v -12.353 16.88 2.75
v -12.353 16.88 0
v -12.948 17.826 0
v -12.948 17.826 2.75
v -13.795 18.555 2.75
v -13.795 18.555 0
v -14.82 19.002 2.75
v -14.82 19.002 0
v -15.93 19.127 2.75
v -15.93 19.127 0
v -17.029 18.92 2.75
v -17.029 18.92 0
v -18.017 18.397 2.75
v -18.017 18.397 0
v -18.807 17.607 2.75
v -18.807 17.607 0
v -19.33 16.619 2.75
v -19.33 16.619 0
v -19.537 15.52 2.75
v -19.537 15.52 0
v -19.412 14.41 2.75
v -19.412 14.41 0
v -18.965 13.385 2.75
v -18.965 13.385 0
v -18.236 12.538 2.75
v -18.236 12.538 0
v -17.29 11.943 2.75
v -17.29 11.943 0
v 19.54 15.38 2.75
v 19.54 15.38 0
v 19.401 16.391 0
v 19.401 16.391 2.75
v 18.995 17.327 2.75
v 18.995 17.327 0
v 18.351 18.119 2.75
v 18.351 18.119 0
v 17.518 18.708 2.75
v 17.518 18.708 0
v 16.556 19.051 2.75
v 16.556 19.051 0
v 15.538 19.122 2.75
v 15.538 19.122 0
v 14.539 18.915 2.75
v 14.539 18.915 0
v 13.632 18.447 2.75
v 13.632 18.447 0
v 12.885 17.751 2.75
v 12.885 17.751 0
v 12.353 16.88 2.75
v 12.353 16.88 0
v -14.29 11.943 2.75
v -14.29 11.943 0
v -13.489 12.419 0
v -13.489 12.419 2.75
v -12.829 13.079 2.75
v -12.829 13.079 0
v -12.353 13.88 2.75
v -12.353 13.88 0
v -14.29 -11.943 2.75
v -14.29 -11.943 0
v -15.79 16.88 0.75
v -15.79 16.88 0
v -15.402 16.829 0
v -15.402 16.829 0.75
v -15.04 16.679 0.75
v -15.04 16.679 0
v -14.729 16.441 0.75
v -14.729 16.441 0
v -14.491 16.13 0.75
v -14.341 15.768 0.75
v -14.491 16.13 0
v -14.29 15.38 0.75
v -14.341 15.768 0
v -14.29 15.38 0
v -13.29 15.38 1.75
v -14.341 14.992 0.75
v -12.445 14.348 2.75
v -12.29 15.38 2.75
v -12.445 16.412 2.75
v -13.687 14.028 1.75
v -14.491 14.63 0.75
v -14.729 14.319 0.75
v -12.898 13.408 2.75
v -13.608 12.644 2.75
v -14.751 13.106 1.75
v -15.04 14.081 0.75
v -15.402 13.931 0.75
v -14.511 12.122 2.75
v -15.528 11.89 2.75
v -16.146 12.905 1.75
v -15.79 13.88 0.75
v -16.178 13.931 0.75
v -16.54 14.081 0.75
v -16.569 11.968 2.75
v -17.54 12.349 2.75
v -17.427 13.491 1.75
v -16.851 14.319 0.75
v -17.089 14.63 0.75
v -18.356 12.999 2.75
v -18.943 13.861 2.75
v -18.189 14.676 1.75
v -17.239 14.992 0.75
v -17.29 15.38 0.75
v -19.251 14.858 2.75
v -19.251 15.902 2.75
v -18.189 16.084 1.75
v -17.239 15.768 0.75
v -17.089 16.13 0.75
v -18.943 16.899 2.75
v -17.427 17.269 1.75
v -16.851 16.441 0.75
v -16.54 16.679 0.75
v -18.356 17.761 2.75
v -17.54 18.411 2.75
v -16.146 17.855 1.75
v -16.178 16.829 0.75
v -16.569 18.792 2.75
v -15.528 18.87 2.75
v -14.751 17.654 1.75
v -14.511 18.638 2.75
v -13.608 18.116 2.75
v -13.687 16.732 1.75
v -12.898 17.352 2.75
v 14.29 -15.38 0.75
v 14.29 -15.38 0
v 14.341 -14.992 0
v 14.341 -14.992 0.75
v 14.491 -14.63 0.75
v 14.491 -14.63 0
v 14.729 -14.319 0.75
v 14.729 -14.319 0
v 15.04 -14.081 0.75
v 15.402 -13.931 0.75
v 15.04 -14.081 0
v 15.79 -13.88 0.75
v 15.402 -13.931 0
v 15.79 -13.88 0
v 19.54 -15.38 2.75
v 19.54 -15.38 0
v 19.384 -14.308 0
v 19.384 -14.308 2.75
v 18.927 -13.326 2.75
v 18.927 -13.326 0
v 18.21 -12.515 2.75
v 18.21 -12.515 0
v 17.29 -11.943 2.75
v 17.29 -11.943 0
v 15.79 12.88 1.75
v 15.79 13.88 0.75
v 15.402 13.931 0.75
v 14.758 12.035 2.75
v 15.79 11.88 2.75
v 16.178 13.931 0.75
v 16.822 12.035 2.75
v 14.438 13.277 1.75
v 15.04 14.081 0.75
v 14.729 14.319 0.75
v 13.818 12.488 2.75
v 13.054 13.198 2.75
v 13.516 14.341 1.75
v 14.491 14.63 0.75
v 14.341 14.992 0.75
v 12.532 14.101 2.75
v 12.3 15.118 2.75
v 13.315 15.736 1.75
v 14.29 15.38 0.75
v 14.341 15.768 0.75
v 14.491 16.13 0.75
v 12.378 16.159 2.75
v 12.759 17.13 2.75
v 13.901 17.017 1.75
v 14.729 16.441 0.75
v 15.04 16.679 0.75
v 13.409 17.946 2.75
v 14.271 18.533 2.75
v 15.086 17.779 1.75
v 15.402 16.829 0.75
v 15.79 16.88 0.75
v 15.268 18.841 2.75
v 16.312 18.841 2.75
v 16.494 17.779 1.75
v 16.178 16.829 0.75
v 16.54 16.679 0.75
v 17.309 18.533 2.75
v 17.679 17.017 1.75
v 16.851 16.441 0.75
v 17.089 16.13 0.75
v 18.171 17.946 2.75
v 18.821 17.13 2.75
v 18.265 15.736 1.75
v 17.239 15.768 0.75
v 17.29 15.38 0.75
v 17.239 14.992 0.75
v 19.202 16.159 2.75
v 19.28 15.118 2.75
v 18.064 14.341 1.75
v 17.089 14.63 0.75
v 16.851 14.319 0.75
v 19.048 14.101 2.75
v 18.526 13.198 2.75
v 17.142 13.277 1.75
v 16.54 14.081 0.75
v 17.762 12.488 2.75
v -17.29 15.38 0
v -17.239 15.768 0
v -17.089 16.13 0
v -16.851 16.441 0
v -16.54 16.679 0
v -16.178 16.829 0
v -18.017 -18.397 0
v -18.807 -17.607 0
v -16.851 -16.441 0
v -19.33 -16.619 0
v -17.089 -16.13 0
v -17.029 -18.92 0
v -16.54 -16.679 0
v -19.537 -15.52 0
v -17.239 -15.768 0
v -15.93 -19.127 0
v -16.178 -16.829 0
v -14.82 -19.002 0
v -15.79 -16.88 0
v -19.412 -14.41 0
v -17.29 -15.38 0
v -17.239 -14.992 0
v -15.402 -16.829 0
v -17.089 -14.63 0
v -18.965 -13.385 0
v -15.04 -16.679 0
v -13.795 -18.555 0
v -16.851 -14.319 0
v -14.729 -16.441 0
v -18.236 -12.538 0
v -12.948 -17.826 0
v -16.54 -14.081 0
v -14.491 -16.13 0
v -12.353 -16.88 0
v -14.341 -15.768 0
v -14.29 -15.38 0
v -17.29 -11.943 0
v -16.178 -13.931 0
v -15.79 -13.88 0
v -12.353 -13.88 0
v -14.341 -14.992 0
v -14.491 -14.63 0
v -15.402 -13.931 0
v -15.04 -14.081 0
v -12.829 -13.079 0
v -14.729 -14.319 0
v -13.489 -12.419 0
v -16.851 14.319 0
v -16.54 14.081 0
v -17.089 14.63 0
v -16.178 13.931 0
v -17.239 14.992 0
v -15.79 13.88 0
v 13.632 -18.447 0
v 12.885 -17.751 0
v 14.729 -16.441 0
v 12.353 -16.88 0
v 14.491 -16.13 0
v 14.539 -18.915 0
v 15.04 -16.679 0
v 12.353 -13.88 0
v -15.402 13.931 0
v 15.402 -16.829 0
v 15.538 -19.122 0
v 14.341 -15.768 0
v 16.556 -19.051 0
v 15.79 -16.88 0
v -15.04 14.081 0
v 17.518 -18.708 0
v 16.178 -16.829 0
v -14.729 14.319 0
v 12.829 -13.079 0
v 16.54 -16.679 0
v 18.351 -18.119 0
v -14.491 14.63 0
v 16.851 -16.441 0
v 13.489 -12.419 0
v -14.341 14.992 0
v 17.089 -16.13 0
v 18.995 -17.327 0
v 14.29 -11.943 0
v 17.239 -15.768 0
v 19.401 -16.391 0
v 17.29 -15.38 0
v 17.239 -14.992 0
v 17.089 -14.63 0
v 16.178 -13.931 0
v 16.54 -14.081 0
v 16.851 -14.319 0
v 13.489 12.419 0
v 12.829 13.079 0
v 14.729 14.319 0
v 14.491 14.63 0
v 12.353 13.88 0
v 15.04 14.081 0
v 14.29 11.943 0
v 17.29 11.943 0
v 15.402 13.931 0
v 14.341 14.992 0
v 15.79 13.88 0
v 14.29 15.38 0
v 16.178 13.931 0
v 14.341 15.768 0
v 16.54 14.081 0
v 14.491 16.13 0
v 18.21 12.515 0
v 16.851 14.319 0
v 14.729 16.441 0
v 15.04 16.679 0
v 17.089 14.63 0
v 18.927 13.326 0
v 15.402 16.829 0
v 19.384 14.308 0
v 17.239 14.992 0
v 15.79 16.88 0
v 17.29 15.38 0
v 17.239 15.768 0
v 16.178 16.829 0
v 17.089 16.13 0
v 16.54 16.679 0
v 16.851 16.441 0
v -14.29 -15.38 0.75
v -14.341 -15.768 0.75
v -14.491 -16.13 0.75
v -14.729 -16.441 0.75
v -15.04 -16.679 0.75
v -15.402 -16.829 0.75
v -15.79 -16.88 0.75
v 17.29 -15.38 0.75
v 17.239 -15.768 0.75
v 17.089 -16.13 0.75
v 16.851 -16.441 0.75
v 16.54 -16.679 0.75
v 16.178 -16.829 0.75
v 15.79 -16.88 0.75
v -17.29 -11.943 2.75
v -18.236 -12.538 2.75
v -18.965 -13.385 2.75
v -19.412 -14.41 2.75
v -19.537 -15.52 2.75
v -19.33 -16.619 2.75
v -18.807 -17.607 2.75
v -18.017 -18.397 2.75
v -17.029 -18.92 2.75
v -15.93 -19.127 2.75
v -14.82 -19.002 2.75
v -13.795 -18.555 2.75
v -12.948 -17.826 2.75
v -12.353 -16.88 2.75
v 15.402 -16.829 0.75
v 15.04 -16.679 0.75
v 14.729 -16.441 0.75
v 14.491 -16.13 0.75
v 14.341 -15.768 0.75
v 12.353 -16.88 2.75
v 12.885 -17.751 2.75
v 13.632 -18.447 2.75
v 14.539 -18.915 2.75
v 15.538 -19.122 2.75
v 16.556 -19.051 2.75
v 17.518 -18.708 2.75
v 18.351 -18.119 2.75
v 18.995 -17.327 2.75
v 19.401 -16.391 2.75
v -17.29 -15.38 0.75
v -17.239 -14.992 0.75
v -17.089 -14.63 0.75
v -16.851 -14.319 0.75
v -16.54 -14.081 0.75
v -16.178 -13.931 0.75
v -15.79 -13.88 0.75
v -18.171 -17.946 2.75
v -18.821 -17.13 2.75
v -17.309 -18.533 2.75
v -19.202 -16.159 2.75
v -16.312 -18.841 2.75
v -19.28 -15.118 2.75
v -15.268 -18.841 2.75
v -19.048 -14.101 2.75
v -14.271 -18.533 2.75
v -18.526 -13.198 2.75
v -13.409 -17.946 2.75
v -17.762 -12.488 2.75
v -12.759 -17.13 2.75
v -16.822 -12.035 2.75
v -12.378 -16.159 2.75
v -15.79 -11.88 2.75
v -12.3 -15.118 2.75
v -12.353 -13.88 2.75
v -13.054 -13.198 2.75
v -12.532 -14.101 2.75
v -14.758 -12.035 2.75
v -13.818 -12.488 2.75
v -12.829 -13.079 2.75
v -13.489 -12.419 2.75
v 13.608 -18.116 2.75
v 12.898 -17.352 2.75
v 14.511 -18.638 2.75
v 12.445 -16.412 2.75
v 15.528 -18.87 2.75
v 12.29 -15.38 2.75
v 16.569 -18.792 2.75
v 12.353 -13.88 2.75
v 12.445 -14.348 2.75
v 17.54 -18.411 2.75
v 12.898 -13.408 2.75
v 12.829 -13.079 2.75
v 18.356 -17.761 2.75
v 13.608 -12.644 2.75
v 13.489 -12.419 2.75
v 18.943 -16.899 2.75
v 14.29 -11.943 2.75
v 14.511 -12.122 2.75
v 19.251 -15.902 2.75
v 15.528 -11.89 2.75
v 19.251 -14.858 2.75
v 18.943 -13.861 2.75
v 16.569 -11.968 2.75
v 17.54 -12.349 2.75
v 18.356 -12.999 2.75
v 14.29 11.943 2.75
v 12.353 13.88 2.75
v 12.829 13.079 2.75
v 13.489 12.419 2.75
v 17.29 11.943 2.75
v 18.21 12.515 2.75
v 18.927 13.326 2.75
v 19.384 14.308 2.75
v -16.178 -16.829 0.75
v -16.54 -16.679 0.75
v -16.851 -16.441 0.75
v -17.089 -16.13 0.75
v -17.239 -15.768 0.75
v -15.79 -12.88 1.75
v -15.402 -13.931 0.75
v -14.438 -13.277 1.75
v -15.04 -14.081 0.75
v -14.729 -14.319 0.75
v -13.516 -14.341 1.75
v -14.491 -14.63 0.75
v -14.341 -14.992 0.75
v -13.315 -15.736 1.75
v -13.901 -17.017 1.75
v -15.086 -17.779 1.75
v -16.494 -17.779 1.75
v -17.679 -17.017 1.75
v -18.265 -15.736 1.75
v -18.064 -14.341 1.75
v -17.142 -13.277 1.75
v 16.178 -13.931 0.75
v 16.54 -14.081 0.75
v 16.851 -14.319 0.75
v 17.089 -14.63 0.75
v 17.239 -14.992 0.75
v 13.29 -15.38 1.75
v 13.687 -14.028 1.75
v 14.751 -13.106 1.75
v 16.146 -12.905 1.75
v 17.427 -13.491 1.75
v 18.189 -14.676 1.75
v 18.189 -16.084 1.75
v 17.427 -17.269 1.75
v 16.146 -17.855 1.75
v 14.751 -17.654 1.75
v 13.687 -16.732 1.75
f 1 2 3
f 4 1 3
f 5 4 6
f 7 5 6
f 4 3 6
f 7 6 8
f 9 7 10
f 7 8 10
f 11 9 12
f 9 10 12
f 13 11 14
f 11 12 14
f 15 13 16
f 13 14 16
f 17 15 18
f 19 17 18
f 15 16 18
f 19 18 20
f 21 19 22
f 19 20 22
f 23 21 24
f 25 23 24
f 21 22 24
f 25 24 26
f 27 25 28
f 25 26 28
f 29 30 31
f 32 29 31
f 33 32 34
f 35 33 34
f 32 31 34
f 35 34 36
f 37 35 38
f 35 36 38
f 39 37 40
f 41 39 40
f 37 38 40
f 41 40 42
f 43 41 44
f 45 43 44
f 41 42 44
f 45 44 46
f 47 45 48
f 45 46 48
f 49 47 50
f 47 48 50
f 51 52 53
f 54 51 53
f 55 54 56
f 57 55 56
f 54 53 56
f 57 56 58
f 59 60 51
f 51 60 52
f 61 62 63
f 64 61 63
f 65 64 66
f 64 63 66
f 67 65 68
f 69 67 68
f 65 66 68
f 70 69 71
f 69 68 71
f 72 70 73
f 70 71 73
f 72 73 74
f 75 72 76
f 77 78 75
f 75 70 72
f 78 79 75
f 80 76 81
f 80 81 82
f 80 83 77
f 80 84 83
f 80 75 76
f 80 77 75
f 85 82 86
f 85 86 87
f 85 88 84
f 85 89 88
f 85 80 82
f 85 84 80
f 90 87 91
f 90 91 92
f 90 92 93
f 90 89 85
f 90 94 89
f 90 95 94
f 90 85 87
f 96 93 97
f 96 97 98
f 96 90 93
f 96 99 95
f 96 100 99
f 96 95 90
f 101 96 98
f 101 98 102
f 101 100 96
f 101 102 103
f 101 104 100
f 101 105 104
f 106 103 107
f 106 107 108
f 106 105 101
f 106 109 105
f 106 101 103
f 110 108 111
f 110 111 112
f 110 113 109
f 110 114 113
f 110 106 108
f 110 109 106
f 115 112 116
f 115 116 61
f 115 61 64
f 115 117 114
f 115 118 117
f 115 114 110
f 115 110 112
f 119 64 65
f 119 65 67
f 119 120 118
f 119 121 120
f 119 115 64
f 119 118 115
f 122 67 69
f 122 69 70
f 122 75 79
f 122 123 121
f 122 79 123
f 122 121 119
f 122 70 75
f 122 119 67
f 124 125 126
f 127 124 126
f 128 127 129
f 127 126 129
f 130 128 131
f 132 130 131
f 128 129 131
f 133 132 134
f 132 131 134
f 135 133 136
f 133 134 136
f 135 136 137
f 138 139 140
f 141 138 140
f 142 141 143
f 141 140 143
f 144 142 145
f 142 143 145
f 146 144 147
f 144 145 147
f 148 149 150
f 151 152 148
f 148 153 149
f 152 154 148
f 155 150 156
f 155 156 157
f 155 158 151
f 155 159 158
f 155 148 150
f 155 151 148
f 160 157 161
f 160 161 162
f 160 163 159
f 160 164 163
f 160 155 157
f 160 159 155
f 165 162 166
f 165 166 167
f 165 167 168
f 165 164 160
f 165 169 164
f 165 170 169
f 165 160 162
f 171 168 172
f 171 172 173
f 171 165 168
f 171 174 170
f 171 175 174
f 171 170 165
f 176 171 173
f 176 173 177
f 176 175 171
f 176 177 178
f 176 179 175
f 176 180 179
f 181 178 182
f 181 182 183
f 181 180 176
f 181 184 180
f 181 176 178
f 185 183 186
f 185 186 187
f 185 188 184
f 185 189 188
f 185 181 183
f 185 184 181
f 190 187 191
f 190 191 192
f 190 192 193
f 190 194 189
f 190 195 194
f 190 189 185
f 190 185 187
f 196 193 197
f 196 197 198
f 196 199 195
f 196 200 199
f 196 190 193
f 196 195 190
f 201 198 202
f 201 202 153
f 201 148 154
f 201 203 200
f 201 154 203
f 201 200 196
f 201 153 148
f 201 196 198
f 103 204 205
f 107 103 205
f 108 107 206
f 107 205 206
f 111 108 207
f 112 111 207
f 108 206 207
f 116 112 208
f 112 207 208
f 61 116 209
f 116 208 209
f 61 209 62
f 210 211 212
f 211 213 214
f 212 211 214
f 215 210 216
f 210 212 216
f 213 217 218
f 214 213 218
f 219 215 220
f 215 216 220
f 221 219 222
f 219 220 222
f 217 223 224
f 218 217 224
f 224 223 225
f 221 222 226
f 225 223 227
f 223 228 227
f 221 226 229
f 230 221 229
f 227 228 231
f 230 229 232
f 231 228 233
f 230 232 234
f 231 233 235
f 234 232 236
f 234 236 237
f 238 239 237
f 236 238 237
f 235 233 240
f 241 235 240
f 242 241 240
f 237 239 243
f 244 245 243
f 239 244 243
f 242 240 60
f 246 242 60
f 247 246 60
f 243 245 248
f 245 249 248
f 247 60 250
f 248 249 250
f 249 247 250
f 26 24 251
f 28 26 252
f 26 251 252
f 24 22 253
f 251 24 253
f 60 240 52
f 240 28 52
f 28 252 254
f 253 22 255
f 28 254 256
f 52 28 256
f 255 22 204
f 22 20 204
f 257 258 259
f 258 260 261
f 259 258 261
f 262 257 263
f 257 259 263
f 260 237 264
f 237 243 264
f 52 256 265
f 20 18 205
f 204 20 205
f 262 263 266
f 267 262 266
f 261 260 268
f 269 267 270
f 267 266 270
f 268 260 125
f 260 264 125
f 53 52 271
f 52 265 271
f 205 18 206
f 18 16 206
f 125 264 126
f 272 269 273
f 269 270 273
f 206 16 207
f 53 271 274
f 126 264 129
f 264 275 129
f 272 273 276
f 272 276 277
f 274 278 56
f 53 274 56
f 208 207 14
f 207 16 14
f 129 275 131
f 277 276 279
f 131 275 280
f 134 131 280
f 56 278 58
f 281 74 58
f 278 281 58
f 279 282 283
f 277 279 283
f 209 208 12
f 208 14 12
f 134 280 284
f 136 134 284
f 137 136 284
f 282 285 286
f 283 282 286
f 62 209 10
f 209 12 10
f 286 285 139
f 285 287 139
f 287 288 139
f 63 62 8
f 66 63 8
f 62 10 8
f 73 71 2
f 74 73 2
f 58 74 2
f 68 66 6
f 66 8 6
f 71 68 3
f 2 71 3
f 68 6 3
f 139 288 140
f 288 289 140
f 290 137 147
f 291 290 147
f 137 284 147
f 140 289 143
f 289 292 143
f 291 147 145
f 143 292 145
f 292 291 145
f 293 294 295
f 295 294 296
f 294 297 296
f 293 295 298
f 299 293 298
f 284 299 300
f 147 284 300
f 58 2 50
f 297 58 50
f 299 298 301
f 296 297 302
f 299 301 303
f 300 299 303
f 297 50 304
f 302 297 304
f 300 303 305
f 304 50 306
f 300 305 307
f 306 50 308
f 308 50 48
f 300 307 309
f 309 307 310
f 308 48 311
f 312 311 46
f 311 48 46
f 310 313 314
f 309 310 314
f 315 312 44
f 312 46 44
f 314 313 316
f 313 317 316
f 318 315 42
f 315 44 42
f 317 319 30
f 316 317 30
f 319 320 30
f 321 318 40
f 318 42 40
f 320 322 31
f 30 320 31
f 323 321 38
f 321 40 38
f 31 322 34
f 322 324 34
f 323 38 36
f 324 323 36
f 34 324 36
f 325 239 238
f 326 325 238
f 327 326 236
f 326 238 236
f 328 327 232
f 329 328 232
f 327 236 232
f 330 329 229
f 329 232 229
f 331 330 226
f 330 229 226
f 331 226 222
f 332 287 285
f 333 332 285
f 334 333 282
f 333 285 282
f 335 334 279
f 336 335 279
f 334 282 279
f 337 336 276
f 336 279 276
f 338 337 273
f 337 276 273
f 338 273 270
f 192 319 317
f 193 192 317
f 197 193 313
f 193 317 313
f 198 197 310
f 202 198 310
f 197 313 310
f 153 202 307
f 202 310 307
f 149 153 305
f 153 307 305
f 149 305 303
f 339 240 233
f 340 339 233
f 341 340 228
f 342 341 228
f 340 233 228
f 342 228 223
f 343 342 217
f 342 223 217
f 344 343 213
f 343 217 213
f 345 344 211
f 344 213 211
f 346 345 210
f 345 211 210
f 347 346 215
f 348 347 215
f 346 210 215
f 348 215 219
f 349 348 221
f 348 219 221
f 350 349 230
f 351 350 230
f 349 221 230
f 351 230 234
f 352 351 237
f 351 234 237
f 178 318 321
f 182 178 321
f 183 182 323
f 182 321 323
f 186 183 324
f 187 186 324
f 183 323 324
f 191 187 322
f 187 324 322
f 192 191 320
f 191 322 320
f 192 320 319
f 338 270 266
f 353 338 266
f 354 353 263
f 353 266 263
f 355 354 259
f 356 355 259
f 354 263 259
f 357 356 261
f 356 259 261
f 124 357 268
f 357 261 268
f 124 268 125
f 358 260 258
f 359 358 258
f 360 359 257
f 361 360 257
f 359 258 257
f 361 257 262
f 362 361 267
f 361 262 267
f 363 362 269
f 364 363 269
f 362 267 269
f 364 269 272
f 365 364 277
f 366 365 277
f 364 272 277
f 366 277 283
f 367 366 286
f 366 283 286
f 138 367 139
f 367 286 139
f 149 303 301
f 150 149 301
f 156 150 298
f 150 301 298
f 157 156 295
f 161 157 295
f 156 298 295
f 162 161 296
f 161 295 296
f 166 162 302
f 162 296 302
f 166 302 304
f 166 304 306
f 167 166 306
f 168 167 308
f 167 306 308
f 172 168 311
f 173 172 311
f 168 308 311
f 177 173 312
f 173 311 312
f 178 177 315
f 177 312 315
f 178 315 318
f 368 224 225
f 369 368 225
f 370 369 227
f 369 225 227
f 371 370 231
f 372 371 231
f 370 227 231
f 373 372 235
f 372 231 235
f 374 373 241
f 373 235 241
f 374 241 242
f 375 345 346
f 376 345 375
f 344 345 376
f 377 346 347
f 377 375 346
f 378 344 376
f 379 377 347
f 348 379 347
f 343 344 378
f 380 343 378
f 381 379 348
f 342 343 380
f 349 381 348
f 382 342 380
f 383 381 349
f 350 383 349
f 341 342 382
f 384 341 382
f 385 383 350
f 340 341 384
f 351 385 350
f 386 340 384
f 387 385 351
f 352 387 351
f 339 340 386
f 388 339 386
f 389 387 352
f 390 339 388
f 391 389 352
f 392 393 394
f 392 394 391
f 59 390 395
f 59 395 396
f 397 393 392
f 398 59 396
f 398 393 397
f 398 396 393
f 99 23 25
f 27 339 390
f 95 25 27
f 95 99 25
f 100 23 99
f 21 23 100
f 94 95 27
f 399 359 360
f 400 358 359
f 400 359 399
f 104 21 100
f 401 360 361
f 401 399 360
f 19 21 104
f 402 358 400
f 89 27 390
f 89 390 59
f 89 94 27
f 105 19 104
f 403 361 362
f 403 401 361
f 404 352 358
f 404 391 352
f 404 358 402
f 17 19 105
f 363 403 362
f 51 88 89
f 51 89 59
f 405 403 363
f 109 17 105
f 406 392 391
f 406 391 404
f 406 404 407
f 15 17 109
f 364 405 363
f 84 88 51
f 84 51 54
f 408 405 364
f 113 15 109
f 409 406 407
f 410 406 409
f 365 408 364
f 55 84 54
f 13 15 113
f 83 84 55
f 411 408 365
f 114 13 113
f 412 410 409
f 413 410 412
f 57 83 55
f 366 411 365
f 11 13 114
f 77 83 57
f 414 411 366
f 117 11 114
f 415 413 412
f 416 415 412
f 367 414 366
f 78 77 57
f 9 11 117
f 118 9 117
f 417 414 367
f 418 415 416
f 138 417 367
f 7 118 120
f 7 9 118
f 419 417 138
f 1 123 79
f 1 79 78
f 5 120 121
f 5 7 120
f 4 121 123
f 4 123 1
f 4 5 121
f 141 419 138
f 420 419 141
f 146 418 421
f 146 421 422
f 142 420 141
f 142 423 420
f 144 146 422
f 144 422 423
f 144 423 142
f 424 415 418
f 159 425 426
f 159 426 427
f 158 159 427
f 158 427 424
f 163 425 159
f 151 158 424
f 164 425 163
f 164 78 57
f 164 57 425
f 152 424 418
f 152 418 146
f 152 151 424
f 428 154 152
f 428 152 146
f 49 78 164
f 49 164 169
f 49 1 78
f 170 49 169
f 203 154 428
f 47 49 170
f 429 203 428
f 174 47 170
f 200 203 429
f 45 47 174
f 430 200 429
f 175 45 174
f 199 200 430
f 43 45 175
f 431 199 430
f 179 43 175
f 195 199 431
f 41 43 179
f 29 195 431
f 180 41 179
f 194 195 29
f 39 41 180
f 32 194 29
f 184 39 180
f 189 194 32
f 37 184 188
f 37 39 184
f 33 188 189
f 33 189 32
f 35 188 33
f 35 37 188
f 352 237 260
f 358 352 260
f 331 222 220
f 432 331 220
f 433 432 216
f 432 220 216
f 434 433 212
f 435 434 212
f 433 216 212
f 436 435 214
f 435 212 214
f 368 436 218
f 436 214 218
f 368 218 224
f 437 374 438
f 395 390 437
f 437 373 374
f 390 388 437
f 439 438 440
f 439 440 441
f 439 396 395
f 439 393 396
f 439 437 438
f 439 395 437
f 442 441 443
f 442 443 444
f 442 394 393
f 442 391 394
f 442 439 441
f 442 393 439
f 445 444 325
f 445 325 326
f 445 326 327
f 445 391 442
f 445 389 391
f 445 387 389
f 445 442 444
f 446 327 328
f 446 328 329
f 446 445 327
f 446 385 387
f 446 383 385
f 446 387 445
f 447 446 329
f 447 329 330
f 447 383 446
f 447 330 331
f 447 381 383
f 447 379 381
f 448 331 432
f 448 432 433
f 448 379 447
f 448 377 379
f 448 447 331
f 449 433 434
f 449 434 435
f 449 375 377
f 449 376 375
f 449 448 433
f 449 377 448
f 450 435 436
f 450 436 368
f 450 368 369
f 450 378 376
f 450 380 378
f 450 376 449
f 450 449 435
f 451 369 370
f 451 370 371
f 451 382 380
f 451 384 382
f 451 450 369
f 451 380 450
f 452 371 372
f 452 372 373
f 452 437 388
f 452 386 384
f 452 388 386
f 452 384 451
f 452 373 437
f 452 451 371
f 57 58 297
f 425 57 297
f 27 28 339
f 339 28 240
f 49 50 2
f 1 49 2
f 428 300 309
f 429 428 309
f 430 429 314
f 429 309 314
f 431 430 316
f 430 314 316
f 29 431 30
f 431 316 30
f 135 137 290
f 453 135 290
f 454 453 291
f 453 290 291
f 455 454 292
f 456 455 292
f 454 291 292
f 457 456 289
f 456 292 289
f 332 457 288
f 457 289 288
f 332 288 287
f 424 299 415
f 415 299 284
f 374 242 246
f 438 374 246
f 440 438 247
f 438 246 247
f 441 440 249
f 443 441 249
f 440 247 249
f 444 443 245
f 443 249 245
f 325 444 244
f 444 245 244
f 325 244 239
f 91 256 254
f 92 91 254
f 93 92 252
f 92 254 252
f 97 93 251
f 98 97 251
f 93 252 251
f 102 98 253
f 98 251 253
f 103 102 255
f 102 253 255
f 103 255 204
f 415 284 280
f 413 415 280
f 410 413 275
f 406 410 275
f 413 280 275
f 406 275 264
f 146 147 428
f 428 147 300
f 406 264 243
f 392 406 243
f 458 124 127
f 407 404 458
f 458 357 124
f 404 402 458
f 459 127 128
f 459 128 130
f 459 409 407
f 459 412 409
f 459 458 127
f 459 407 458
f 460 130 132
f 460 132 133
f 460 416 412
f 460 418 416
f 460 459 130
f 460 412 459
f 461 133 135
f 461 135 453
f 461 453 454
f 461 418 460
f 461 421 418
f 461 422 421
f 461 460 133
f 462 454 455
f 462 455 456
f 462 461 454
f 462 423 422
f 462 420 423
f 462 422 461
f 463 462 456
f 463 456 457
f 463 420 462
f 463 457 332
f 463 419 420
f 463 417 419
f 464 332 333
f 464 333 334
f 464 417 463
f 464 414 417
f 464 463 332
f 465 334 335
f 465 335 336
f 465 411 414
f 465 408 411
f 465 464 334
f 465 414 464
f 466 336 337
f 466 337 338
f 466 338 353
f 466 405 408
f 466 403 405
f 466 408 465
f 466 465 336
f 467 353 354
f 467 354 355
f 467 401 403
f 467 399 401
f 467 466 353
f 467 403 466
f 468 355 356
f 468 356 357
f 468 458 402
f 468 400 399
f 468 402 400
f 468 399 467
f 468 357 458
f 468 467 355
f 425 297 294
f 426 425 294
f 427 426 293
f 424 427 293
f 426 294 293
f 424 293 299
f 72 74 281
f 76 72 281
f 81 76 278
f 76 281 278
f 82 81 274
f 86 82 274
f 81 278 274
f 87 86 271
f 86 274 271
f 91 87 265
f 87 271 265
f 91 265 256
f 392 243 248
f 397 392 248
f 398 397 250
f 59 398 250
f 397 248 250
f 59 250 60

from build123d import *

# Parameters (mm, degrees)
F1_DEPTH = 2.75


# Not quite as in the source:
# - a fillet or chamfer that OpenCascade refuses, or shapes differently, is made with other operations: its cross-section is extruded or revolved along the edge and cut away or added


with BuildPart() as f1:
    # F0 (on Top) → F1 (new body)
    with BuildSketch(Plane.XY):
        with BuildLine():
            ThreePointArc((-15.79, 16.88), (-14.7293398282, 16.4406601718), (-14.29, 15.38))
            Line((-14.29, 15.38), (-14.29, 13.88))
            Line((-14.29, 13.88), (-12.3530682288, 13.88))
            ThreePointArc((-12.3530682288, 13.88), (-12.1191013265, 14.6138388362), (-12.04, 15.38))
            ThreePointArc((-12.04, 15.38), (-12.1191013265, 16.1461611638), (-12.3530682288, 16.88))
            Line((-12.3530682288, 16.88), (-15.79, 16.88))
        make_face()
        with BuildLine():
            ThreePointArc((-17.29, 15.38), (-16.8506601718, 16.4406601718), (-15.79, 16.88))
            Line((-15.79, 16.88), (-12.3530682288, 16.88))
            ThreePointArc((-12.3530682288, 16.88), (-18.4416504294, 18.0316504294), (-17.29, 11.9430682288))
            Line((-17.29, 11.9430682288), (-17.29, 15.38))
        make_face()
        with BuildLine():
            Line((-14.29, 13.88), (-15.79, 13.88))
            ThreePointArc((-15.79, 13.88), (-16.8506601718, 14.3193398282), (-17.29, 15.38))
            Line((-17.29, 15.38), (-17.29, 11.9430682288))
            ThreePointArc((-17.29, 11.9430682288), (-15.79, 11.63), (-14.29, 11.9430682288))
            Line((-14.29, 11.9430682288), (-14.29, 13.88))
        make_face()
        with BuildLine():
            Line((12.3530682288, 16.88), (-12.3530682288, 16.88))
            ThreePointArc((-12.3530682288, 16.88), (-12.1191013265, 16.1461611638), (-12.04, 15.38))
            ThreePointArc((-12.04, 15.38), (-12.1191013265, 14.6138388362), (-12.3530682288, 13.88))
            Line((-12.3530682288, 13.88), (12.3530682288, 13.88))
            ThreePointArc((12.3530682288, 13.88), (12.04, 15.38), (12.3530682288, 16.88))
        make_face()
        with BuildLine():
            Line((-14.29, -11.9430682288), (-14.29, 11.9430682288))
            ThreePointArc((-14.29, 11.9430682288), (-15.79, 11.63), (-17.29, 11.9430682288))
            Line((-17.29, 11.9430682288), (-17.29, -11.9430682288))
            ThreePointArc((-17.29, -11.9430682288), (-15.79, -11.63), (-14.29, -11.9430682288))
        make_face()
        with BuildLine():
            Line((15.79, 16.88), (12.3530682288, 16.88))
            ThreePointArc((12.3530682288, 16.88), (12.04, 15.38), (12.3530682288, 13.88))
            Line((12.3530682288, 13.88), (14.29, 13.88))
            Line((14.29, 13.88), (14.29, 15.38))
            ThreePointArc((14.29, 15.38), (14.7293398282, 16.4406601718), (15.79, 16.88))
        make_face()
        with BuildLine():
            ThreePointArc((19.54, 15.38), (16.5561611638, 19.0508986735), (12.3530682288, 16.88))
            Line((12.3530682288, 16.88), (15.79, 16.88))
            ThreePointArc((15.79, 16.88), (16.8506601718, 16.4406601718), (17.29, 15.38))
            Line((17.29, 15.38), (17.29, 11.9430682288))
            ThreePointArc((17.29, 11.9430682288), (18.9274750995, 13.3260404094), (19.54, 15.38))
        make_face()
        with BuildLine():
            Line((-14.29, -13.88), (-14.29, -11.9430682288))
            ThreePointArc((-14.29, -11.9430682288), (-15.79, -11.63), (-17.29, -11.9430682288))
            Line((-17.29, -11.9430682288), (-17.29, -15.38))
            ThreePointArc((-17.29, -15.38), (-16.8506601718, -14.3193398282), (-15.79, -13.88))
            Line((-15.79, -13.88), (-14.29, -13.88))
        make_face()
        with BuildLine():
            Line((-17.29, -15.38), (-17.29, -11.9430682288))
            ThreePointArc((-17.29, -11.9430682288), (-18.4416504294, -18.0316504294), (-12.3530682288, -16.88))
            Line((-12.3530682288, -16.88), (-15.79, -16.88))
            ThreePointArc((-15.79, -16.88), (-16.8506601718, -16.4406601718), (-17.29, -15.38))
        make_face()
        with BuildLine():
            Line((12.3530682288, -13.88), (-12.3530682288, -13.88))
            ThreePointArc((-12.3530682288, -13.88), (-12.1191013265, -14.6138388362), (-12.04, -15.38))
            ThreePointArc((-12.04, -15.38), (-12.1191013265, -16.1461611638), (-12.3530682288, -16.88))
            Line((-12.3530682288, -16.88), (12.3530682288, -16.88))
            ThreePointArc((12.3530682288, -16.88), (12.04, -15.38), (12.3530682288, -13.88))
        make_face()
        with BuildLine():
            ThreePointArc((-12.04, -15.38), (-12.1191013265, -14.6138388362), (-12.3530682288, -13.88))
            Line((-12.3530682288, -13.88), (-14.29, -13.88))
            Line((-14.29, -13.88), (-14.29, -15.38))
            ThreePointArc((-14.29, -15.38), (-14.7293398282, -16.4406601718), (-15.79, -16.88))
            Line((-15.79, -16.88), (-12.3530682288, -16.88))
            ThreePointArc((-12.3530682288, -16.88), (-12.1191013265, -16.1461611638), (-12.04, -15.38))
        make_face()
        with BuildLine():
            Line((14.29, 13.88), (14.29, 11.9430682288))
            ThreePointArc((14.29, 11.9430682288), (15.79, 11.63), (17.29, 11.9430682288))
            Line((17.29, 11.9430682288), (17.29, 15.38))
            ThreePointArc((17.29, 15.38), (16.8506601718, 14.3193398282), (15.79, 13.88))
            Line((15.79, 13.88), (14.29, 13.88))
        make_face()
        with BuildLine():
            ThreePointArc((17.29, 11.9430682288), (15.79, 11.63), (14.29, 11.9430682288))
            Line((14.29, 11.9430682288), (14.29, -11.9430682288))
            ThreePointArc((14.29, -11.9430682288), (15.79, -11.63), (17.29, -11.9430682288))
            Line((17.29, -11.9430682288), (17.29, 11.9430682288))
        make_face()
        with BuildLine():
            Line((14.29, -13.88), (12.3530682288, -13.88))
            ThreePointArc((12.3530682288, -13.88), (12.04, -15.38), (12.3530682288, -16.88))
            Line((12.3530682288, -16.88), (15.79, -16.88))
            ThreePointArc((15.79, -16.88), (14.7293398282, -16.4406601718), (14.29, -15.38))
            Line((14.29, -15.38), (14.29, -13.88))
        make_face()
        with BuildLine():
            ThreePointArc((17.29, -11.9430682288), (15.79, -11.63), (14.29, -11.9430682288))
            Line((14.29, -11.9430682288), (14.29, -13.88))
            Line((14.29, -13.88), (15.79, -13.88))
            ThreePointArc((15.79, -13.88), (16.8506601718, -14.3193398282), (17.29, -15.38))
            Line((17.29, -15.38), (17.29, -11.9430682288))
        make_face()
        with BuildLine():
            Line((15.79, -16.88), (12.3530682288, -16.88))
            ThreePointArc((12.3530682288, -16.88), (16.5561611638, -19.0508986735), (19.54, -15.38))
            ThreePointArc((19.54, -15.38), (18.9274750995, -13.3260404094), (17.29, -11.9430682288))
            Line((17.29, -11.9430682288), (17.29, -15.38))
            ThreePointArc((17.29, -15.38), (16.8506601718, -16.4406601718), (15.79, -16.88))
        make_face()
        with BuildLine():
            Line((-14.29, 13.88), (-14.29, 15.38))
            ThreePointArc((-14.29, 15.38), (-14.7293398282, 14.3193398282), (-15.79, 13.88))
            Line((-15.79, 13.88), (-14.29, 13.88))
        make_face()
        with BuildLine():
            Line((-12.3530682288, 13.88), (-14.29, 13.88))
            Line((-14.29, 13.88), (-14.29, 11.9430682288))
            ThreePointArc((-14.29, 11.9430682288), (-13.1383495706, 12.7283495706), (-12.3530682288, 13.88))
        make_face()
        with BuildLine():
            Line((14.29, 13.88), (12.3530682288, 13.88))
            ThreePointArc((12.3530682288, 13.88), (13.1383495706, 12.7283495706), (14.29, 11.9430682288))
            Line((14.29, 11.9430682288), (14.29, 13.88))
        make_face()
        with BuildLine():
            Line((14.29, 15.38), (14.29, 13.88))
            Line((14.29, 13.88), (15.79, 13.88))
            ThreePointArc((15.79, 13.88), (14.7293398282, 14.3193398282), (14.29, 15.38))
        make_face()
        with BuildLine():
            Line((-14.29, -15.38), (-14.29, -13.88))
            Line((-14.29, -13.88), (-15.79, -13.88))
            ThreePointArc((-15.79, -13.88), (-14.7293398282, -14.3193398282), (-14.29, -15.38))
        make_face()
        with BuildLine():
            ThreePointArc((-12.3530682288, -13.88), (-13.1383495706, -12.7283495706), (-14.29, -11.9430682288))
            Line((-14.29, -11.9430682288), (-14.29, -13.88))
            Line((-14.29, -13.88), (-12.3530682288, -13.88))
        make_face()
        with BuildLine():
            Line((15.79, -13.88), (14.29, -13.88))
            Line((14.29, -13.88), (14.29, -15.38))
            ThreePointArc((14.29, -15.38), (14.7293398282, -14.3193398282), (15.79, -13.88))
        make_face()
        with BuildLine():
            ThreePointArc((14.29, -11.9430682288), (13.1383495706, -12.7283495706), (12.3530682288, -13.88))
            Line((12.3530682288, -13.88), (14.29, -13.88))
            Line((14.29, -13.88), (14.29, -11.9430682288))
        make_face()
    extrude(amount=F1_DEPTH)

    # F2: chamfer of 2 on 4 edges, made by hand

    # F2_s1 → F2_t2 (revolve, cut)
    with BuildSketch(Plane.XZ.offset(-15.38)):
        Polygon((-14.29, 0.75), (-12.29, 2.75), (-14.29, 2.75), align=None)
    revolve(axis=Axis((-15.79, 15.38, 2.75), (0, 0, -1)), mode=Mode.SUBTRACT)

    # F2_s3 → F2_t4 (revolve, cut)
    with BuildSketch(Plane.YZ.offset(15.79)):
        Polygon((13.88, 0.75), (11.88, 2.75), (13.88, 2.75), align=None)
    revolve(axis=Axis((15.79, 15.38, 2.75), (0, 0, -1)), mode=Mode.SUBTRACT)

    # F2_s5 → F2_t6 (revolve, cut)
    with BuildSketch(Plane.XZ.offset(15.38)):
        Polygon((14.29, 0.75), (12.29, 2.75), (14.29, 2.75), align=None)
    revolve(axis=Axis((15.79, -15.38, 2.75), (0, 0, -1)), mode=Mode.SUBTRACT)

    # F2_s7 → F2_t8 (revolve, cut)
    with BuildSketch(Plane.YZ.offset(-15.79)):
        Polygon((-13.88, 0.75), (-11.88, 2.75), (-13.88, 2.75), align=None)
    revolve(axis=Axis((-15.79, -15.38, 2.75), (0, 0, -1)), mode=Mode.SUBTRACT)


solid = f1.part
